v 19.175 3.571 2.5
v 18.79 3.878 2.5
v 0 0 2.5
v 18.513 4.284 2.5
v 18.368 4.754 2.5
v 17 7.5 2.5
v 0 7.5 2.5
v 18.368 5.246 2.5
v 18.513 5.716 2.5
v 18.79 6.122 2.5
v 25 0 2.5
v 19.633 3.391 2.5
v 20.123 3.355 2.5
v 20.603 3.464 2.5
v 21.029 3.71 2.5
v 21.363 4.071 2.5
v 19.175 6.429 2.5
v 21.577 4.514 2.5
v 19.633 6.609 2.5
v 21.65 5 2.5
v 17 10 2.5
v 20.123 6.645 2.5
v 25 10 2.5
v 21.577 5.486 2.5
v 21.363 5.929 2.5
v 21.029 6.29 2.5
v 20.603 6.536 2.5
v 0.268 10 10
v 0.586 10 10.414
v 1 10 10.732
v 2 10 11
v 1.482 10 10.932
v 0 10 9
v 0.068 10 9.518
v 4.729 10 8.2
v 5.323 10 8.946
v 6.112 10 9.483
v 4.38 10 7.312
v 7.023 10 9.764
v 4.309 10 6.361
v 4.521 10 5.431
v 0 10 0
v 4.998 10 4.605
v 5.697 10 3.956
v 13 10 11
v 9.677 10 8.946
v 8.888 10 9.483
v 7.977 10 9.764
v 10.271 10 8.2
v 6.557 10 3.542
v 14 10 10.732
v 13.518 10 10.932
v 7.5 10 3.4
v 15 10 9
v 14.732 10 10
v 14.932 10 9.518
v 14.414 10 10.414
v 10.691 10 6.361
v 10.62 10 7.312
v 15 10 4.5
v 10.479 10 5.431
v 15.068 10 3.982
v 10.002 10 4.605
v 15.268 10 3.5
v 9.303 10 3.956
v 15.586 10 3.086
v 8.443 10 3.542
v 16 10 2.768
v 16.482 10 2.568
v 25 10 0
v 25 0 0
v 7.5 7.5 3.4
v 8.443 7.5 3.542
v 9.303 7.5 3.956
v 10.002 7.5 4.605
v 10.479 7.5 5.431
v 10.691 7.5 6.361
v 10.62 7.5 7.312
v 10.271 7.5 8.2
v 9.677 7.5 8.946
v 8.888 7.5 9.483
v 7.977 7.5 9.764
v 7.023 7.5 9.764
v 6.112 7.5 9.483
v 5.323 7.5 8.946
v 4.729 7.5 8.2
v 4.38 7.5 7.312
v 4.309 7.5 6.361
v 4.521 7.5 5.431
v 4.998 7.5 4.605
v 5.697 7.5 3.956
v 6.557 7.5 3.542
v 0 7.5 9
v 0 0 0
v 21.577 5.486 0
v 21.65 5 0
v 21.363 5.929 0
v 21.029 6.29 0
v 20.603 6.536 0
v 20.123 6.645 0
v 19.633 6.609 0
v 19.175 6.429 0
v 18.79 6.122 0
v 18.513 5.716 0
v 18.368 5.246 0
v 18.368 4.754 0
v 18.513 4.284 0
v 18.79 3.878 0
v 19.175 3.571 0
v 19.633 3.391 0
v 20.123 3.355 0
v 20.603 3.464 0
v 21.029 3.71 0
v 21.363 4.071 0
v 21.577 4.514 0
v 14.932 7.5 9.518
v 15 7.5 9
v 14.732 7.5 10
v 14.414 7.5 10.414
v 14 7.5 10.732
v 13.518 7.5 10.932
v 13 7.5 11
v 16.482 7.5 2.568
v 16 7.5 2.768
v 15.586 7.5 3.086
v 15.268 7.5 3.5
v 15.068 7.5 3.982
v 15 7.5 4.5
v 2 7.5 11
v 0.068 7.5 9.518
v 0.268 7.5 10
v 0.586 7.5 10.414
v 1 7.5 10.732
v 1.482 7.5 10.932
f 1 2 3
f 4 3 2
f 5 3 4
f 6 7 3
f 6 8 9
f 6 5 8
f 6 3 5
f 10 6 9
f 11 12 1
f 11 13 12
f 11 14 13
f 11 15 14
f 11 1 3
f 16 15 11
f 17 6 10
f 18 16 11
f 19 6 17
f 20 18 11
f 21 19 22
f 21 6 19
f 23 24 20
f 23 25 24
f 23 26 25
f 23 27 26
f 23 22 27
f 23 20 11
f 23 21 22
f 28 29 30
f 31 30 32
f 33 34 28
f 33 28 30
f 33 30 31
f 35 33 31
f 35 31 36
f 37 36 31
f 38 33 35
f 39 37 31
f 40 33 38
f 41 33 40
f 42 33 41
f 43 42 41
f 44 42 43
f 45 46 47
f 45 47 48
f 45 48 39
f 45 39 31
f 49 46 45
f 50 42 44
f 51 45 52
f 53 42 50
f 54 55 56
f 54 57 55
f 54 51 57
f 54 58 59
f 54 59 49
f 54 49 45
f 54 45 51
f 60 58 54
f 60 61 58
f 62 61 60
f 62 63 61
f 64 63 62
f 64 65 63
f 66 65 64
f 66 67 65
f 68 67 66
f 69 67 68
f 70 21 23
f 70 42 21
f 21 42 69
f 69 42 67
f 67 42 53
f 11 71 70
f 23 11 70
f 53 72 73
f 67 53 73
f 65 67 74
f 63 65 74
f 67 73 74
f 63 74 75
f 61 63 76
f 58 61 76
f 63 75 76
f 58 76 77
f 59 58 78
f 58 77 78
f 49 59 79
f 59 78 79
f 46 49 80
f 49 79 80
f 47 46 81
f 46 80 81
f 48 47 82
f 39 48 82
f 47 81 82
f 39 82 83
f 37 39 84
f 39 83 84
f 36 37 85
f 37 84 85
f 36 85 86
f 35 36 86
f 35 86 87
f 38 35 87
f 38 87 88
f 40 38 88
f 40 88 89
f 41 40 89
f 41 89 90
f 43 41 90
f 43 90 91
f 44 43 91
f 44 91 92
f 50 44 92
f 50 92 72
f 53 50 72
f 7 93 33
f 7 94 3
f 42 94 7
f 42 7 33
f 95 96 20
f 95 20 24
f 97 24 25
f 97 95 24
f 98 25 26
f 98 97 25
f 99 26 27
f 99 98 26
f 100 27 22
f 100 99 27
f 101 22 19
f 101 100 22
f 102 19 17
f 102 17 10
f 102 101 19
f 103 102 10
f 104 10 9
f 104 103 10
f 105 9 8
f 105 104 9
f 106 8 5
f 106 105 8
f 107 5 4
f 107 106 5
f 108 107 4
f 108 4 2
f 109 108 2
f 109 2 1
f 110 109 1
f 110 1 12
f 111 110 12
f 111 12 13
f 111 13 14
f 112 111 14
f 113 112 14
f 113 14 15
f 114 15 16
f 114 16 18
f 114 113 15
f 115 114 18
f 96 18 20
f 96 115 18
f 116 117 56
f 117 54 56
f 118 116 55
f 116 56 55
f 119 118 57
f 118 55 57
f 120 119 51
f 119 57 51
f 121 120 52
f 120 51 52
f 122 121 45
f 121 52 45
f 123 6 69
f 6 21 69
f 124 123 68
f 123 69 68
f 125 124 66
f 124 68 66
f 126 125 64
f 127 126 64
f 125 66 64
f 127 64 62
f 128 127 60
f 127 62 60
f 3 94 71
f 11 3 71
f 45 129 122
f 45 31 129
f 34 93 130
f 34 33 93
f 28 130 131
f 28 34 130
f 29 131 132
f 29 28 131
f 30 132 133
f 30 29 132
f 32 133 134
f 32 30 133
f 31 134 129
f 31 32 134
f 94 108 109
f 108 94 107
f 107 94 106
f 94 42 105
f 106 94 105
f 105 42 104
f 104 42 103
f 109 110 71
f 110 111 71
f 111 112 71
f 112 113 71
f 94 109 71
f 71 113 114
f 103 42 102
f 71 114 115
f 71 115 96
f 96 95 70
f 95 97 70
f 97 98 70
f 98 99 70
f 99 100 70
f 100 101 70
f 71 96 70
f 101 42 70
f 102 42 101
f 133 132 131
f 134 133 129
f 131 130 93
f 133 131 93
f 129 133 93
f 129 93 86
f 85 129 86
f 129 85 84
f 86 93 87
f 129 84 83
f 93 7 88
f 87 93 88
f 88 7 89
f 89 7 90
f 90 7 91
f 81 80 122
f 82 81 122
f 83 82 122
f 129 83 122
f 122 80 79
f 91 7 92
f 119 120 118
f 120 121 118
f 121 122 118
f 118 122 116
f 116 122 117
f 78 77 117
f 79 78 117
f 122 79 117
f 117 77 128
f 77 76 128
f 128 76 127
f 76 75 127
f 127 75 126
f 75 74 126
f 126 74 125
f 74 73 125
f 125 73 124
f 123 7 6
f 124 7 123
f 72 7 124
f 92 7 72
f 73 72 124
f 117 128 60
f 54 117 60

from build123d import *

# Parameters (mm, degrees)
SKIZZE1_W                       = 25
SKIZZE1_H                       = 10
SKIZZE1_R                       = 1.65
AUFSATZ_LINEAR_AUSTRAGEN1_DEPTH = 2.5
SKIZZE2_W                       = 15
SKIZZE2_H                       = 2.5
AUFSATZ_LINEAR_AUSTRAGEN2_DEPTH = 8.5
VERRUNDUNG1_R                   = 2
SKIZZE3_R                       = 3.2
SCHNITT_LINEAR_AUSTRAGEN1_DEPTH = 8.5


with BuildPart() as part:
    # Skizze1 → Aufsatz-Linear austragen1 (new body)
    with BuildSketch(Plane.XY):
        with Locations((12.5, 5)):
            Rectangle(SKIZZE1_W, SKIZZE1_H)
        with Locations((20, 5)):
            Circle(SKIZZE1_R, mode=Mode.SUBTRACT)
    extrude(amount=AUFSATZ_LINEAR_AUSTRAGEN1_DEPTH)

    # Skizze2 → Aufsatz-Linear austragen2 (add)
    with BuildSketch(Plane.XY.offset(2.5)):
        with Locations((7.5, 8.75)):
            Rectangle(SKIZZE2_W, SKIZZE2_H)
    extrude(amount=AUFSATZ_LINEAR_AUSTRAGEN2_DEPTH)

    # Verrundung1
    verrundung1_edges = [part.edges().sort_by_distance(p)[0] for p in [
        (15, 8.75, 2.5),
        (0, 8.75, 11),
        (15, 8.75, 11),
    ]]
    fillet(verrundung1_edges, radius=VERRUNDUNG1_R)

    # Skizze3 → Schnitt-Linear austragen1 (cut)
    with BuildSketch(Plane.XZ.offset(-7.5)):
        with Locations(Location((7.5, 6.6, 0), (0, 0, 270))):
            Circle(SKIZZE3_R)
    extrude(amount=-SCHNITT_LINEAR_AUSTRAGEN1_DEPTH, mode=Mode.SUBTRACT)


solid = part.part
